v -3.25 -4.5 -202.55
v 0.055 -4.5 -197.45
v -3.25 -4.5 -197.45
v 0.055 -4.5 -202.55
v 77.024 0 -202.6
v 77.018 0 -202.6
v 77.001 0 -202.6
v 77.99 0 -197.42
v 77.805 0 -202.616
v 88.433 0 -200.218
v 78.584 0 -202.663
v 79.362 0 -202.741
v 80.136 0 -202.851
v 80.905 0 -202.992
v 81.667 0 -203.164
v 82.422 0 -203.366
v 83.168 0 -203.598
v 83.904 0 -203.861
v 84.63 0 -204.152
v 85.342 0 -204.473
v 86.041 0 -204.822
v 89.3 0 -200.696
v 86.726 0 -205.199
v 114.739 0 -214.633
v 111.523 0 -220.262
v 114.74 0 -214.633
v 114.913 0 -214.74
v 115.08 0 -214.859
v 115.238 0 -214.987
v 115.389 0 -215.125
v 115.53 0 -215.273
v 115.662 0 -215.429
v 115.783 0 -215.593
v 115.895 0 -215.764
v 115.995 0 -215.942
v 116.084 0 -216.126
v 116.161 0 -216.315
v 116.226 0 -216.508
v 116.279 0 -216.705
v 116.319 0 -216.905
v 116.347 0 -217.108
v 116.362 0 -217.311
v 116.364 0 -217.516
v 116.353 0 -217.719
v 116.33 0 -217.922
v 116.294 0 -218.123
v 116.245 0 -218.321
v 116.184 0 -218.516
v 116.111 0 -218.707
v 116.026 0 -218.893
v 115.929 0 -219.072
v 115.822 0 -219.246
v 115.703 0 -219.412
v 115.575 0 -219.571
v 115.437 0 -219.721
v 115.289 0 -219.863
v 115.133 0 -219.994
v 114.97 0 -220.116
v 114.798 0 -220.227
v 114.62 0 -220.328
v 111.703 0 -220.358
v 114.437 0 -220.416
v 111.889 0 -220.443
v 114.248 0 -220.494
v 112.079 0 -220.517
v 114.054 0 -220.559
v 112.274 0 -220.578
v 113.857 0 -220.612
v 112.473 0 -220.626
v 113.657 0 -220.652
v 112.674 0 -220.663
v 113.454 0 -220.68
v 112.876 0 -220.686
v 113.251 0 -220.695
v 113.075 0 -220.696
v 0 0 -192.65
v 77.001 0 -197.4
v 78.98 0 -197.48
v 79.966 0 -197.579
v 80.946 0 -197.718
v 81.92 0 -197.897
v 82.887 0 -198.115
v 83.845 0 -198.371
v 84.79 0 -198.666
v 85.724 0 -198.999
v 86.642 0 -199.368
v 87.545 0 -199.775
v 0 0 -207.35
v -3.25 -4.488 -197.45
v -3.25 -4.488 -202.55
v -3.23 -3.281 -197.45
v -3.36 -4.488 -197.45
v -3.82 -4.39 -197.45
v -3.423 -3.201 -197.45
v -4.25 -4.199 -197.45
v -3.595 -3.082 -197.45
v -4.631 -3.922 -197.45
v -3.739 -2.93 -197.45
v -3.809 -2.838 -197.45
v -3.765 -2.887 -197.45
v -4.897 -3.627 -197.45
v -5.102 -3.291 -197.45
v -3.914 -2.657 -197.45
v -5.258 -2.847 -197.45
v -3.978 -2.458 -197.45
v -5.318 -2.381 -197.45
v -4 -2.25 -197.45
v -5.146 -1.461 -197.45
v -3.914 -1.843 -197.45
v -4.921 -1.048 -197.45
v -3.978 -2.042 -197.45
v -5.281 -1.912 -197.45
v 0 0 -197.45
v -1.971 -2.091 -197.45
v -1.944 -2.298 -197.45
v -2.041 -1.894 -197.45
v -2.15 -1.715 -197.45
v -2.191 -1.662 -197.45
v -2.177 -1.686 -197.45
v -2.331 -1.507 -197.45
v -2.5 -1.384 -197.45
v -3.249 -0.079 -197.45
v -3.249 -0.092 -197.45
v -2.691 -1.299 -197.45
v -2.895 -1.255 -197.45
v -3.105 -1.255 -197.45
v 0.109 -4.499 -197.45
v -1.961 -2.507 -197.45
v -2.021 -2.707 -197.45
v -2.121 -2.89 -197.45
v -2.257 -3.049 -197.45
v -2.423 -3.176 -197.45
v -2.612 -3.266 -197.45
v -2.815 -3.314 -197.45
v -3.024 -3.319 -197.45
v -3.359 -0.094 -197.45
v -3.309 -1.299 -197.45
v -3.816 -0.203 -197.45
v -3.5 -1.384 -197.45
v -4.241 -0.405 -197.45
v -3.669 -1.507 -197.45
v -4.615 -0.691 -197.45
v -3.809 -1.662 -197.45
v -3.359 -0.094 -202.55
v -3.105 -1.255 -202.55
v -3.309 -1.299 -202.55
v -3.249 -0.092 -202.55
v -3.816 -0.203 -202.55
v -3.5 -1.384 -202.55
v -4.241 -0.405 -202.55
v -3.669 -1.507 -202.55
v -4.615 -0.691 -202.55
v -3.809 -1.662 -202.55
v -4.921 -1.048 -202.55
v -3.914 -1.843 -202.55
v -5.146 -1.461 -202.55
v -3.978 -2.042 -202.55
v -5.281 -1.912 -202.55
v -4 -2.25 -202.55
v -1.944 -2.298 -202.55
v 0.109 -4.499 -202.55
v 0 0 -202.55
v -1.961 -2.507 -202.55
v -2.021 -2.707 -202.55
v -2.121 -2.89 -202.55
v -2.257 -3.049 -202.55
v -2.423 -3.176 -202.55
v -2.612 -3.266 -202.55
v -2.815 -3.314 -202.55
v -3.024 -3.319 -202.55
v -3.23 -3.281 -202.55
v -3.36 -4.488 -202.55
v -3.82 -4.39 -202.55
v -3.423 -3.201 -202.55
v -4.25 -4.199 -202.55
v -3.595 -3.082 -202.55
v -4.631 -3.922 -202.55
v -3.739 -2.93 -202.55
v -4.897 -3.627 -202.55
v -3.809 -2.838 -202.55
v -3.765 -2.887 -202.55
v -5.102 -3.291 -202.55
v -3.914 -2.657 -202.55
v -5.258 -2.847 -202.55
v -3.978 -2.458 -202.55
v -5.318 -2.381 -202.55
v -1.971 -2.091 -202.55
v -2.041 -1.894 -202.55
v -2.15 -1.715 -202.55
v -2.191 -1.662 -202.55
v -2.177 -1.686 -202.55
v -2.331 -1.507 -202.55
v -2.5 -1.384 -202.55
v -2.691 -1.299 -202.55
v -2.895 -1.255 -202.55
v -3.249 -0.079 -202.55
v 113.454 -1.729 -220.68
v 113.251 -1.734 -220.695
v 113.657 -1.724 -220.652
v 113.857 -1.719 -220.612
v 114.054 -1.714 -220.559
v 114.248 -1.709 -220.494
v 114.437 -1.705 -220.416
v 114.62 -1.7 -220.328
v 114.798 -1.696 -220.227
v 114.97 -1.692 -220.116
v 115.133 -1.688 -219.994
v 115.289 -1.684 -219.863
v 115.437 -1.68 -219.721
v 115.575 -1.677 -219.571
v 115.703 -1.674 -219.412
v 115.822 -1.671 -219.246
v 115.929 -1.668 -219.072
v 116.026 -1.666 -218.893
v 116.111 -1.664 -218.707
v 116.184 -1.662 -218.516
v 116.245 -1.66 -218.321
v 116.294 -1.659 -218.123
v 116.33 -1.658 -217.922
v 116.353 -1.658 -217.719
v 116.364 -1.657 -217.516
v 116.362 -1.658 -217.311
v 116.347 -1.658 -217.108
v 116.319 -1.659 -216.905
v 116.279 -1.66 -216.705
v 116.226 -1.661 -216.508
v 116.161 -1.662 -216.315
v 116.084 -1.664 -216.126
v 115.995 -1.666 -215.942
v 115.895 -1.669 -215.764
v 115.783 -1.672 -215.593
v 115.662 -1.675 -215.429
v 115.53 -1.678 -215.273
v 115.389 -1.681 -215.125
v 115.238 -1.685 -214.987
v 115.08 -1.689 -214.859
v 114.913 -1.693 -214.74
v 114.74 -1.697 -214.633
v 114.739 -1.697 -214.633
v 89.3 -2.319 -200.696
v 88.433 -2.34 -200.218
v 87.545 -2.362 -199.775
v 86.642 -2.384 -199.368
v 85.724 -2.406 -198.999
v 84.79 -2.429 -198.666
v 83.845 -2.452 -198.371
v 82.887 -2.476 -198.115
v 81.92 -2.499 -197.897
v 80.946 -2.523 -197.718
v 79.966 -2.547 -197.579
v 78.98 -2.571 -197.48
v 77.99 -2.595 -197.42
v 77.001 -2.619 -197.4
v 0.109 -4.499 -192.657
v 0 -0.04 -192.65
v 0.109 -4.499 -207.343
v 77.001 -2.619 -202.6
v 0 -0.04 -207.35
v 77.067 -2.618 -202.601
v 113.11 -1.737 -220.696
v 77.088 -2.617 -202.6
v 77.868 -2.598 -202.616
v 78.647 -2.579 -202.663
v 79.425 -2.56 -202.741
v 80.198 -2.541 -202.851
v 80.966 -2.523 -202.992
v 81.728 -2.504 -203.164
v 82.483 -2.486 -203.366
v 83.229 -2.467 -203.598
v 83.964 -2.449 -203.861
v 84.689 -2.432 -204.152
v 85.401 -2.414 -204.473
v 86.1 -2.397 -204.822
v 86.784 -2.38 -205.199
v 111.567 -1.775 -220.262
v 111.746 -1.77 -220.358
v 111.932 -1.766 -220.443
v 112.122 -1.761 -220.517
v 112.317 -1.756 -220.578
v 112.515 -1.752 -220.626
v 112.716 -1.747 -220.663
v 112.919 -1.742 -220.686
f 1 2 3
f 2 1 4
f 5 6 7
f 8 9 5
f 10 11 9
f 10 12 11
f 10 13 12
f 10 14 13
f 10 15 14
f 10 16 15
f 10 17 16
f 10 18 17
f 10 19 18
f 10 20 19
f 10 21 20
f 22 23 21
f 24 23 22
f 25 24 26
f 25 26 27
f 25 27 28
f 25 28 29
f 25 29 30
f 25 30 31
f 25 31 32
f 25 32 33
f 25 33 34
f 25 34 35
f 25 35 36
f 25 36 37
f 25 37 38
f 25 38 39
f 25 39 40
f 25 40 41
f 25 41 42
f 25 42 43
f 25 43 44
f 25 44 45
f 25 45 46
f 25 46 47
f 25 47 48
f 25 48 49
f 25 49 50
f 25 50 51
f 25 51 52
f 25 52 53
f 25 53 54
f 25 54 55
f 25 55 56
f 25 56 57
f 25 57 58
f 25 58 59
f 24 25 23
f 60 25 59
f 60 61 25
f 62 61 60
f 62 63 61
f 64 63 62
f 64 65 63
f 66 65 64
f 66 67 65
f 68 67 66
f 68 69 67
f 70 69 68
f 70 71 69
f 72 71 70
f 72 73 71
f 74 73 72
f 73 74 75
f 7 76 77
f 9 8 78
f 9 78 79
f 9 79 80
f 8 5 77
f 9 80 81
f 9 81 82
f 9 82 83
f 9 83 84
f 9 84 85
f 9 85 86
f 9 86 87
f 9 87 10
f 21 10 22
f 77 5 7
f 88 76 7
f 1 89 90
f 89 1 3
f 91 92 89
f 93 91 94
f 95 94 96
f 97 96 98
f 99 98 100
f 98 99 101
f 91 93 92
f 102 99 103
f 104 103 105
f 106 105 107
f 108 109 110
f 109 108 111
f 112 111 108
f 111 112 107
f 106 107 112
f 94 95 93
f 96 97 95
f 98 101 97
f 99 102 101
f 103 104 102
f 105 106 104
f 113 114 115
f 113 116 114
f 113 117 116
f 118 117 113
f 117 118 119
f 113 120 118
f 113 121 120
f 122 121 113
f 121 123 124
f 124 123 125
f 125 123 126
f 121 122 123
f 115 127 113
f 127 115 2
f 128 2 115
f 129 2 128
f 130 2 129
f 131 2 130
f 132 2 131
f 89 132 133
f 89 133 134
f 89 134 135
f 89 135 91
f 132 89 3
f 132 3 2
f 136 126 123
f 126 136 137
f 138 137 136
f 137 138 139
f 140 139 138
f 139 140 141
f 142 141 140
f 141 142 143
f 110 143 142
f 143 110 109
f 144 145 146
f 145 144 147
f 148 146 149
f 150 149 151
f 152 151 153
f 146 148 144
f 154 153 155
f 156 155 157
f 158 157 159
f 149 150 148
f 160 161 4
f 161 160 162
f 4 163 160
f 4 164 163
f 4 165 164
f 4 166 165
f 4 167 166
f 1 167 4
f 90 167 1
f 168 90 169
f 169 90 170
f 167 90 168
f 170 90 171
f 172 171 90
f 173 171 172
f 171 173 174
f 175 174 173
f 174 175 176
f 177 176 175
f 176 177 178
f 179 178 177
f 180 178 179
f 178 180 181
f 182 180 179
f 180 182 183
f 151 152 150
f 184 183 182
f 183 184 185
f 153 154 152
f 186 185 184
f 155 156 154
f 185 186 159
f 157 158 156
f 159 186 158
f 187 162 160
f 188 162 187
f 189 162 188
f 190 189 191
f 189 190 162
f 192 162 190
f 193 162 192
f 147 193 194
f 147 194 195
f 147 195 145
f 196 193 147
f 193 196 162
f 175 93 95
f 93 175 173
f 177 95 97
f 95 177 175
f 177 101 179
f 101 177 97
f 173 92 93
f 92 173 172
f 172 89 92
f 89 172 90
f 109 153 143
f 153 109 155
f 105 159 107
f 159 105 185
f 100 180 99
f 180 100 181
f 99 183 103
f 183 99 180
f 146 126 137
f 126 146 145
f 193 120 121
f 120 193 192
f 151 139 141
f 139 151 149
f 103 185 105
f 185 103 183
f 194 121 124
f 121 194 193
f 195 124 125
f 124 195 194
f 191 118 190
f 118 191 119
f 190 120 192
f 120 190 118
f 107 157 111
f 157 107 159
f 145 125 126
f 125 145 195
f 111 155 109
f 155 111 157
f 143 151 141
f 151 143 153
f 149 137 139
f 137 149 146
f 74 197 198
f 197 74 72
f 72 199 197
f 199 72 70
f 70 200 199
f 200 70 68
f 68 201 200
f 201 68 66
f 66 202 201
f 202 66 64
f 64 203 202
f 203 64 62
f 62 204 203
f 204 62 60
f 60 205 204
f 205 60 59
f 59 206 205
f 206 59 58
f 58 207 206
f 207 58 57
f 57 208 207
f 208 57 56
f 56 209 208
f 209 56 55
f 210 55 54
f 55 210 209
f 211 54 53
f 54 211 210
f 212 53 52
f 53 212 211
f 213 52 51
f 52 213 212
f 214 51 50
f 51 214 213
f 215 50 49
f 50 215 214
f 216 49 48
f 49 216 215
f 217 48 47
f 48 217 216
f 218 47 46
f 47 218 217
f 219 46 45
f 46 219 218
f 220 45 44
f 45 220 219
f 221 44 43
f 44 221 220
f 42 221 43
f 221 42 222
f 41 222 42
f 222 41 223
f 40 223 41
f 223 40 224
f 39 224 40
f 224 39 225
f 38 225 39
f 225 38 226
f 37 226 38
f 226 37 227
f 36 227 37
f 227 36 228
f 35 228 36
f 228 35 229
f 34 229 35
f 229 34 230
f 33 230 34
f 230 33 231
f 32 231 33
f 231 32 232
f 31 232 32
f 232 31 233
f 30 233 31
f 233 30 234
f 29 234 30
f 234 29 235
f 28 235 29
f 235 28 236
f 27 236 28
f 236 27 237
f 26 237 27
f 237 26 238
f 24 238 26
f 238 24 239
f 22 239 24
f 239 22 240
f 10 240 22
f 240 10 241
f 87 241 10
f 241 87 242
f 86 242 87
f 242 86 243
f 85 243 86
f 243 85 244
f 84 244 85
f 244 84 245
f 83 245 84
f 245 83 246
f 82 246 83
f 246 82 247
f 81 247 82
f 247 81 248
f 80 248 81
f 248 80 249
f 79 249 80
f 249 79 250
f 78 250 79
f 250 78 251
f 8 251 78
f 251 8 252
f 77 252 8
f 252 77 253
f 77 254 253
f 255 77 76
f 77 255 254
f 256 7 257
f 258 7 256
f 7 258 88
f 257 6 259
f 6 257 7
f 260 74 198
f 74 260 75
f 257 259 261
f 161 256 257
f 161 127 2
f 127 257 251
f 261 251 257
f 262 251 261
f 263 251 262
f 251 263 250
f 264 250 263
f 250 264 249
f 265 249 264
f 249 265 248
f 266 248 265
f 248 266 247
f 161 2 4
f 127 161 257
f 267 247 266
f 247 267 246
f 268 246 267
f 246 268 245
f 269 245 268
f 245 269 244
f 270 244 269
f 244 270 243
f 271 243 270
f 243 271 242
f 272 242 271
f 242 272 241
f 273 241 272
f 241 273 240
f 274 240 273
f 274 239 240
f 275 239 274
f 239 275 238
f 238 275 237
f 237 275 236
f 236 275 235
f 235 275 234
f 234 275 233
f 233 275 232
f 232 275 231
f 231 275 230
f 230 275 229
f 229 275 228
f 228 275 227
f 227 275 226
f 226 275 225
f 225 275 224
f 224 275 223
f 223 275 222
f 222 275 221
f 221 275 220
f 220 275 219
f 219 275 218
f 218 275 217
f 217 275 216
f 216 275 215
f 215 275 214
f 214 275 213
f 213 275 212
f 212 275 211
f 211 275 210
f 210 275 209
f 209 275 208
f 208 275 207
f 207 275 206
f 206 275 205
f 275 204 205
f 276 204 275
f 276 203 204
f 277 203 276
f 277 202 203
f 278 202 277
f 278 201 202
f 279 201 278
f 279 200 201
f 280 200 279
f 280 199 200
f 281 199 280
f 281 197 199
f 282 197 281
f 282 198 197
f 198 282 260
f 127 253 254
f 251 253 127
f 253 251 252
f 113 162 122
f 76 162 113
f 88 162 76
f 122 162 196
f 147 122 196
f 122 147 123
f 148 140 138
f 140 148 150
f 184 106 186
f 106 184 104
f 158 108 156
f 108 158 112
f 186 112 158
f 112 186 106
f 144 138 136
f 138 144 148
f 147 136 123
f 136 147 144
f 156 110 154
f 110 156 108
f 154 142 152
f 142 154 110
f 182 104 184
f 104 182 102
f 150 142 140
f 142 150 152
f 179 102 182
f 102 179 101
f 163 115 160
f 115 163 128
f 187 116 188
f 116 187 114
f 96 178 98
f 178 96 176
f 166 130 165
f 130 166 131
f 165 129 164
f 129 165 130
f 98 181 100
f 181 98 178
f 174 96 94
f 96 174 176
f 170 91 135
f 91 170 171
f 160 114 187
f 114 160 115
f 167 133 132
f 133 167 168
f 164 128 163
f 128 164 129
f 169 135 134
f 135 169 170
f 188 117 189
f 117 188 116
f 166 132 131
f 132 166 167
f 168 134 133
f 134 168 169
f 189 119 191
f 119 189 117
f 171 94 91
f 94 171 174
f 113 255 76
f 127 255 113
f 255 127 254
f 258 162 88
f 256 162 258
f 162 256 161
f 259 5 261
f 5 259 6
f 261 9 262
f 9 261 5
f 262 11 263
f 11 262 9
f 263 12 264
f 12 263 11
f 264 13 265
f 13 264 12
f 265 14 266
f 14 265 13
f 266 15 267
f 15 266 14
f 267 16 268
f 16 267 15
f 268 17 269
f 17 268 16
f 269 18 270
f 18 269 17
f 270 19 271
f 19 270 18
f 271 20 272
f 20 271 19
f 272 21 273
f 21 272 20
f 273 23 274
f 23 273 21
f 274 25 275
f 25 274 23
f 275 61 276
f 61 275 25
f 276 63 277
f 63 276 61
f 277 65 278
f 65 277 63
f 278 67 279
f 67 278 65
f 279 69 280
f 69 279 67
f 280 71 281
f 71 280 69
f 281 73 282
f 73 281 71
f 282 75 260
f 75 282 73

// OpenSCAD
/* [Temples (Arms)] */
//Height of the temple
Temple_Height = 14.2;		//[8:0.1:20]
//Width of the temple
Temple_Width = 4.5;		//[2:0.1:10]
//Amount of taper
Temple_Taper = 1.4;	//[0:0.1:3]
//If curving, enable this after you have set all of the other options because Thingiverse displays the model very small.
Curved_Temple = "No"; //[Yes,No]
//Amount of curve
Temple_Curve = 35;	//[0:100]


/* [Hinge] */
//Hinge height
Hinge_Height = 5.6;	//[2:0.1:16]
//Hinge screw hole radius
Screw_Radius = 1.0;			//[0.1:0.1:2]
//Hinge temple offset spacer
Hinge_Spacer = 5;			//[1:0.1:10]
//Gap tolerance
Tolerance = 0.5; 			//[0:0.1:1]

/* [Ear Bend] */
//Temple length to ear curve
Temple_Length1 = 77;  //[50:100]
//Ear Bend Radius
Ear_Radius = 22;		//[10:40]
//Ear Bend Radius
Ear_Radius2 = 14;		//[5:40]
// Temple end length
Temple_Length2 = 29;	//[10:40]
//Ear bend angle
Temple_Angle = 30;	//[10:45]

/* [Hidden] */

$fn = 100; 

temple_h1 = Temple_Height+.5; // Arm height adjustment
temple_h2 = Temple_Height-9;	// Ear bend height adjustment
temple_h3 = Temple_Height-7.7;	// Arm end height adjustment



eps = 1e-3;


translate([0, 0, -200])
rotate(90, [1,0,0])
intersection() {
	rotate(Temple_Taper, [0,1,0])
	temple();
	temple();
}

$t = 50;




module temple() {

	if (Curved_Temple == "Yes") {
		translate([0, 20, 0]) 
		rotate(-90, [0,0,1])
		parabolic_bend([400, 500, Temple_Width*1.5], (Temple_Curve * .0001))
		translate([20, 0, 0]) 
		rotate(90, [0,0,1])
			linear_extrude(height=Temple_Width) _temple();
	}else{
		linear_extrude(height=Temple_Width) _temple();
	}

		translate([-(Hinge_Spacer+1)/2, 0, (Temple_Width+2)/2])
			difference() {
                                union() {
												// hinge body
                                    translate([(Temple_Width)/2,0,-1])
												//cube([Hinge_Spacer+1-(Temple_Width+2)/2, Hinge_Height-0.5, Temple_Width+2], center=true);
                                    cube([Hinge_Spacer, Hinge_Height-Tolerance, Temple_Width], center=true);
                                    // curved hinge edge
												translate([-((Temple_Width)/4)+1, 0, -1]) rotate([90,0,0])
                                    cylinder(r=(Temple_Width)/2, h=Hinge_Height-Tolerance, center=true, $fn=30);
                                }
				// screw hole
				translate([0, 0, -1])
				rotate([90, 0, 0]) cylinder(r=Screw_Radius, h=Hinge_Height+0.5, center=true, $fn=30); 
			}
}


module _temple() {
	hull() {
		// main body
		square([eps, temple_h1], center=true); 
		translate([Temple_Length1+eps, 0]) square([eps,temple_h2], center=true);
		
	}
	// ear curve
	translate([Temple_Length1, 0]) for (i=[0:Ear_Radius2-1]) hull() {
		translate([sin(Temple_Angle*i/(Ear_Radius2-1))*Ear_Radius, -(1-cos(Temple_Angle*i/(Ear_Radius2-1)))*Ear_Radius]) 
			rotate(-Temple_Angle*i/(Ear_Radius2-1)) 
				square([eps, temple_h2], center=true);
		
		translate([sin(Temple_Angle*(i+1)/(Ear_Radius2-1))*Ear_Radius, -(1-cos(Temple_Angle*(i+1)/(Ear_Radius2-1)))*Ear_Radius]) 
			rotate(-Temple_Angle*(i+1)/(Ear_Radius2-1)) 
				square([eps, temple_h2], center=true);
	}
	//tail piece
	translate([Temple_Length1+sin(Temple_Angle)*Ear_Radius, -(1-cos(Temple_Angle))*Ear_Radius])
		rotate(-Temple_Angle) hull() {
			square([eps, temple_h2], center=true);
			translate([Temple_Length2, 0]) square([eps,temple_h3], center=true);
 		translate([Temple_Length2, 0]) circle(temple_h3/2);
		}
}



// Bend flat object on parabole
// dimensions: vector with dimensions of the object that should be bent
// steepness:  coeficient 'a' of the function 'y = a * x^2'
// nsteps:     number of parts the object will be split into before being bent 
module parabolic_bend(dimensions, steepness, nsteps = $fn) {
	function curr_z(step, ysw) = steepness * pow(step * ysw, 2);
	function flat_width(step, ysw) = 
		ysw * sqrt(pow(2 * steepness * step * ysw, 2) + 1);
	function acc_y(step, ysw) =
		step == 0 ? ysw / 2 : acc_y(step - 1, ysw) + flat_width(step, ysw);

	assign(max_y = dimensions.y / sqrt(1 + steepness))
	assign(ysw = nsteps == 0 ? tan($fa) / (2 * steepness) : max_y / nsteps)
	assign(steps = nsteps == 0 ? max_y / ysw : nsteps)
	{
		intersection() {
			children(0);
			cube([dimensions.x, ysw/2, dimensions.z]);
		}      		

		for (step = [1:ceil(steps)]) {
			assign(curr_flat = flat_width(step, ysw))
			assign(acc_flat = acc_y(step - 1, ysw))
			assign(angle = atan(2 * steepness * step * ysw))
			{
				translate([0, step * ysw, curr_z(step, ysw)])
   				rotate(angle, [1, 0, 0])
						translate([0, -acc_flat - curr_flat/2, 0])
							intersection() {
								children(0);
								translate([0, acc_flat, 0])
									cube([dimensions.x, curr_flat, dimensions.z]);
							}
			}
		}
	}
}
